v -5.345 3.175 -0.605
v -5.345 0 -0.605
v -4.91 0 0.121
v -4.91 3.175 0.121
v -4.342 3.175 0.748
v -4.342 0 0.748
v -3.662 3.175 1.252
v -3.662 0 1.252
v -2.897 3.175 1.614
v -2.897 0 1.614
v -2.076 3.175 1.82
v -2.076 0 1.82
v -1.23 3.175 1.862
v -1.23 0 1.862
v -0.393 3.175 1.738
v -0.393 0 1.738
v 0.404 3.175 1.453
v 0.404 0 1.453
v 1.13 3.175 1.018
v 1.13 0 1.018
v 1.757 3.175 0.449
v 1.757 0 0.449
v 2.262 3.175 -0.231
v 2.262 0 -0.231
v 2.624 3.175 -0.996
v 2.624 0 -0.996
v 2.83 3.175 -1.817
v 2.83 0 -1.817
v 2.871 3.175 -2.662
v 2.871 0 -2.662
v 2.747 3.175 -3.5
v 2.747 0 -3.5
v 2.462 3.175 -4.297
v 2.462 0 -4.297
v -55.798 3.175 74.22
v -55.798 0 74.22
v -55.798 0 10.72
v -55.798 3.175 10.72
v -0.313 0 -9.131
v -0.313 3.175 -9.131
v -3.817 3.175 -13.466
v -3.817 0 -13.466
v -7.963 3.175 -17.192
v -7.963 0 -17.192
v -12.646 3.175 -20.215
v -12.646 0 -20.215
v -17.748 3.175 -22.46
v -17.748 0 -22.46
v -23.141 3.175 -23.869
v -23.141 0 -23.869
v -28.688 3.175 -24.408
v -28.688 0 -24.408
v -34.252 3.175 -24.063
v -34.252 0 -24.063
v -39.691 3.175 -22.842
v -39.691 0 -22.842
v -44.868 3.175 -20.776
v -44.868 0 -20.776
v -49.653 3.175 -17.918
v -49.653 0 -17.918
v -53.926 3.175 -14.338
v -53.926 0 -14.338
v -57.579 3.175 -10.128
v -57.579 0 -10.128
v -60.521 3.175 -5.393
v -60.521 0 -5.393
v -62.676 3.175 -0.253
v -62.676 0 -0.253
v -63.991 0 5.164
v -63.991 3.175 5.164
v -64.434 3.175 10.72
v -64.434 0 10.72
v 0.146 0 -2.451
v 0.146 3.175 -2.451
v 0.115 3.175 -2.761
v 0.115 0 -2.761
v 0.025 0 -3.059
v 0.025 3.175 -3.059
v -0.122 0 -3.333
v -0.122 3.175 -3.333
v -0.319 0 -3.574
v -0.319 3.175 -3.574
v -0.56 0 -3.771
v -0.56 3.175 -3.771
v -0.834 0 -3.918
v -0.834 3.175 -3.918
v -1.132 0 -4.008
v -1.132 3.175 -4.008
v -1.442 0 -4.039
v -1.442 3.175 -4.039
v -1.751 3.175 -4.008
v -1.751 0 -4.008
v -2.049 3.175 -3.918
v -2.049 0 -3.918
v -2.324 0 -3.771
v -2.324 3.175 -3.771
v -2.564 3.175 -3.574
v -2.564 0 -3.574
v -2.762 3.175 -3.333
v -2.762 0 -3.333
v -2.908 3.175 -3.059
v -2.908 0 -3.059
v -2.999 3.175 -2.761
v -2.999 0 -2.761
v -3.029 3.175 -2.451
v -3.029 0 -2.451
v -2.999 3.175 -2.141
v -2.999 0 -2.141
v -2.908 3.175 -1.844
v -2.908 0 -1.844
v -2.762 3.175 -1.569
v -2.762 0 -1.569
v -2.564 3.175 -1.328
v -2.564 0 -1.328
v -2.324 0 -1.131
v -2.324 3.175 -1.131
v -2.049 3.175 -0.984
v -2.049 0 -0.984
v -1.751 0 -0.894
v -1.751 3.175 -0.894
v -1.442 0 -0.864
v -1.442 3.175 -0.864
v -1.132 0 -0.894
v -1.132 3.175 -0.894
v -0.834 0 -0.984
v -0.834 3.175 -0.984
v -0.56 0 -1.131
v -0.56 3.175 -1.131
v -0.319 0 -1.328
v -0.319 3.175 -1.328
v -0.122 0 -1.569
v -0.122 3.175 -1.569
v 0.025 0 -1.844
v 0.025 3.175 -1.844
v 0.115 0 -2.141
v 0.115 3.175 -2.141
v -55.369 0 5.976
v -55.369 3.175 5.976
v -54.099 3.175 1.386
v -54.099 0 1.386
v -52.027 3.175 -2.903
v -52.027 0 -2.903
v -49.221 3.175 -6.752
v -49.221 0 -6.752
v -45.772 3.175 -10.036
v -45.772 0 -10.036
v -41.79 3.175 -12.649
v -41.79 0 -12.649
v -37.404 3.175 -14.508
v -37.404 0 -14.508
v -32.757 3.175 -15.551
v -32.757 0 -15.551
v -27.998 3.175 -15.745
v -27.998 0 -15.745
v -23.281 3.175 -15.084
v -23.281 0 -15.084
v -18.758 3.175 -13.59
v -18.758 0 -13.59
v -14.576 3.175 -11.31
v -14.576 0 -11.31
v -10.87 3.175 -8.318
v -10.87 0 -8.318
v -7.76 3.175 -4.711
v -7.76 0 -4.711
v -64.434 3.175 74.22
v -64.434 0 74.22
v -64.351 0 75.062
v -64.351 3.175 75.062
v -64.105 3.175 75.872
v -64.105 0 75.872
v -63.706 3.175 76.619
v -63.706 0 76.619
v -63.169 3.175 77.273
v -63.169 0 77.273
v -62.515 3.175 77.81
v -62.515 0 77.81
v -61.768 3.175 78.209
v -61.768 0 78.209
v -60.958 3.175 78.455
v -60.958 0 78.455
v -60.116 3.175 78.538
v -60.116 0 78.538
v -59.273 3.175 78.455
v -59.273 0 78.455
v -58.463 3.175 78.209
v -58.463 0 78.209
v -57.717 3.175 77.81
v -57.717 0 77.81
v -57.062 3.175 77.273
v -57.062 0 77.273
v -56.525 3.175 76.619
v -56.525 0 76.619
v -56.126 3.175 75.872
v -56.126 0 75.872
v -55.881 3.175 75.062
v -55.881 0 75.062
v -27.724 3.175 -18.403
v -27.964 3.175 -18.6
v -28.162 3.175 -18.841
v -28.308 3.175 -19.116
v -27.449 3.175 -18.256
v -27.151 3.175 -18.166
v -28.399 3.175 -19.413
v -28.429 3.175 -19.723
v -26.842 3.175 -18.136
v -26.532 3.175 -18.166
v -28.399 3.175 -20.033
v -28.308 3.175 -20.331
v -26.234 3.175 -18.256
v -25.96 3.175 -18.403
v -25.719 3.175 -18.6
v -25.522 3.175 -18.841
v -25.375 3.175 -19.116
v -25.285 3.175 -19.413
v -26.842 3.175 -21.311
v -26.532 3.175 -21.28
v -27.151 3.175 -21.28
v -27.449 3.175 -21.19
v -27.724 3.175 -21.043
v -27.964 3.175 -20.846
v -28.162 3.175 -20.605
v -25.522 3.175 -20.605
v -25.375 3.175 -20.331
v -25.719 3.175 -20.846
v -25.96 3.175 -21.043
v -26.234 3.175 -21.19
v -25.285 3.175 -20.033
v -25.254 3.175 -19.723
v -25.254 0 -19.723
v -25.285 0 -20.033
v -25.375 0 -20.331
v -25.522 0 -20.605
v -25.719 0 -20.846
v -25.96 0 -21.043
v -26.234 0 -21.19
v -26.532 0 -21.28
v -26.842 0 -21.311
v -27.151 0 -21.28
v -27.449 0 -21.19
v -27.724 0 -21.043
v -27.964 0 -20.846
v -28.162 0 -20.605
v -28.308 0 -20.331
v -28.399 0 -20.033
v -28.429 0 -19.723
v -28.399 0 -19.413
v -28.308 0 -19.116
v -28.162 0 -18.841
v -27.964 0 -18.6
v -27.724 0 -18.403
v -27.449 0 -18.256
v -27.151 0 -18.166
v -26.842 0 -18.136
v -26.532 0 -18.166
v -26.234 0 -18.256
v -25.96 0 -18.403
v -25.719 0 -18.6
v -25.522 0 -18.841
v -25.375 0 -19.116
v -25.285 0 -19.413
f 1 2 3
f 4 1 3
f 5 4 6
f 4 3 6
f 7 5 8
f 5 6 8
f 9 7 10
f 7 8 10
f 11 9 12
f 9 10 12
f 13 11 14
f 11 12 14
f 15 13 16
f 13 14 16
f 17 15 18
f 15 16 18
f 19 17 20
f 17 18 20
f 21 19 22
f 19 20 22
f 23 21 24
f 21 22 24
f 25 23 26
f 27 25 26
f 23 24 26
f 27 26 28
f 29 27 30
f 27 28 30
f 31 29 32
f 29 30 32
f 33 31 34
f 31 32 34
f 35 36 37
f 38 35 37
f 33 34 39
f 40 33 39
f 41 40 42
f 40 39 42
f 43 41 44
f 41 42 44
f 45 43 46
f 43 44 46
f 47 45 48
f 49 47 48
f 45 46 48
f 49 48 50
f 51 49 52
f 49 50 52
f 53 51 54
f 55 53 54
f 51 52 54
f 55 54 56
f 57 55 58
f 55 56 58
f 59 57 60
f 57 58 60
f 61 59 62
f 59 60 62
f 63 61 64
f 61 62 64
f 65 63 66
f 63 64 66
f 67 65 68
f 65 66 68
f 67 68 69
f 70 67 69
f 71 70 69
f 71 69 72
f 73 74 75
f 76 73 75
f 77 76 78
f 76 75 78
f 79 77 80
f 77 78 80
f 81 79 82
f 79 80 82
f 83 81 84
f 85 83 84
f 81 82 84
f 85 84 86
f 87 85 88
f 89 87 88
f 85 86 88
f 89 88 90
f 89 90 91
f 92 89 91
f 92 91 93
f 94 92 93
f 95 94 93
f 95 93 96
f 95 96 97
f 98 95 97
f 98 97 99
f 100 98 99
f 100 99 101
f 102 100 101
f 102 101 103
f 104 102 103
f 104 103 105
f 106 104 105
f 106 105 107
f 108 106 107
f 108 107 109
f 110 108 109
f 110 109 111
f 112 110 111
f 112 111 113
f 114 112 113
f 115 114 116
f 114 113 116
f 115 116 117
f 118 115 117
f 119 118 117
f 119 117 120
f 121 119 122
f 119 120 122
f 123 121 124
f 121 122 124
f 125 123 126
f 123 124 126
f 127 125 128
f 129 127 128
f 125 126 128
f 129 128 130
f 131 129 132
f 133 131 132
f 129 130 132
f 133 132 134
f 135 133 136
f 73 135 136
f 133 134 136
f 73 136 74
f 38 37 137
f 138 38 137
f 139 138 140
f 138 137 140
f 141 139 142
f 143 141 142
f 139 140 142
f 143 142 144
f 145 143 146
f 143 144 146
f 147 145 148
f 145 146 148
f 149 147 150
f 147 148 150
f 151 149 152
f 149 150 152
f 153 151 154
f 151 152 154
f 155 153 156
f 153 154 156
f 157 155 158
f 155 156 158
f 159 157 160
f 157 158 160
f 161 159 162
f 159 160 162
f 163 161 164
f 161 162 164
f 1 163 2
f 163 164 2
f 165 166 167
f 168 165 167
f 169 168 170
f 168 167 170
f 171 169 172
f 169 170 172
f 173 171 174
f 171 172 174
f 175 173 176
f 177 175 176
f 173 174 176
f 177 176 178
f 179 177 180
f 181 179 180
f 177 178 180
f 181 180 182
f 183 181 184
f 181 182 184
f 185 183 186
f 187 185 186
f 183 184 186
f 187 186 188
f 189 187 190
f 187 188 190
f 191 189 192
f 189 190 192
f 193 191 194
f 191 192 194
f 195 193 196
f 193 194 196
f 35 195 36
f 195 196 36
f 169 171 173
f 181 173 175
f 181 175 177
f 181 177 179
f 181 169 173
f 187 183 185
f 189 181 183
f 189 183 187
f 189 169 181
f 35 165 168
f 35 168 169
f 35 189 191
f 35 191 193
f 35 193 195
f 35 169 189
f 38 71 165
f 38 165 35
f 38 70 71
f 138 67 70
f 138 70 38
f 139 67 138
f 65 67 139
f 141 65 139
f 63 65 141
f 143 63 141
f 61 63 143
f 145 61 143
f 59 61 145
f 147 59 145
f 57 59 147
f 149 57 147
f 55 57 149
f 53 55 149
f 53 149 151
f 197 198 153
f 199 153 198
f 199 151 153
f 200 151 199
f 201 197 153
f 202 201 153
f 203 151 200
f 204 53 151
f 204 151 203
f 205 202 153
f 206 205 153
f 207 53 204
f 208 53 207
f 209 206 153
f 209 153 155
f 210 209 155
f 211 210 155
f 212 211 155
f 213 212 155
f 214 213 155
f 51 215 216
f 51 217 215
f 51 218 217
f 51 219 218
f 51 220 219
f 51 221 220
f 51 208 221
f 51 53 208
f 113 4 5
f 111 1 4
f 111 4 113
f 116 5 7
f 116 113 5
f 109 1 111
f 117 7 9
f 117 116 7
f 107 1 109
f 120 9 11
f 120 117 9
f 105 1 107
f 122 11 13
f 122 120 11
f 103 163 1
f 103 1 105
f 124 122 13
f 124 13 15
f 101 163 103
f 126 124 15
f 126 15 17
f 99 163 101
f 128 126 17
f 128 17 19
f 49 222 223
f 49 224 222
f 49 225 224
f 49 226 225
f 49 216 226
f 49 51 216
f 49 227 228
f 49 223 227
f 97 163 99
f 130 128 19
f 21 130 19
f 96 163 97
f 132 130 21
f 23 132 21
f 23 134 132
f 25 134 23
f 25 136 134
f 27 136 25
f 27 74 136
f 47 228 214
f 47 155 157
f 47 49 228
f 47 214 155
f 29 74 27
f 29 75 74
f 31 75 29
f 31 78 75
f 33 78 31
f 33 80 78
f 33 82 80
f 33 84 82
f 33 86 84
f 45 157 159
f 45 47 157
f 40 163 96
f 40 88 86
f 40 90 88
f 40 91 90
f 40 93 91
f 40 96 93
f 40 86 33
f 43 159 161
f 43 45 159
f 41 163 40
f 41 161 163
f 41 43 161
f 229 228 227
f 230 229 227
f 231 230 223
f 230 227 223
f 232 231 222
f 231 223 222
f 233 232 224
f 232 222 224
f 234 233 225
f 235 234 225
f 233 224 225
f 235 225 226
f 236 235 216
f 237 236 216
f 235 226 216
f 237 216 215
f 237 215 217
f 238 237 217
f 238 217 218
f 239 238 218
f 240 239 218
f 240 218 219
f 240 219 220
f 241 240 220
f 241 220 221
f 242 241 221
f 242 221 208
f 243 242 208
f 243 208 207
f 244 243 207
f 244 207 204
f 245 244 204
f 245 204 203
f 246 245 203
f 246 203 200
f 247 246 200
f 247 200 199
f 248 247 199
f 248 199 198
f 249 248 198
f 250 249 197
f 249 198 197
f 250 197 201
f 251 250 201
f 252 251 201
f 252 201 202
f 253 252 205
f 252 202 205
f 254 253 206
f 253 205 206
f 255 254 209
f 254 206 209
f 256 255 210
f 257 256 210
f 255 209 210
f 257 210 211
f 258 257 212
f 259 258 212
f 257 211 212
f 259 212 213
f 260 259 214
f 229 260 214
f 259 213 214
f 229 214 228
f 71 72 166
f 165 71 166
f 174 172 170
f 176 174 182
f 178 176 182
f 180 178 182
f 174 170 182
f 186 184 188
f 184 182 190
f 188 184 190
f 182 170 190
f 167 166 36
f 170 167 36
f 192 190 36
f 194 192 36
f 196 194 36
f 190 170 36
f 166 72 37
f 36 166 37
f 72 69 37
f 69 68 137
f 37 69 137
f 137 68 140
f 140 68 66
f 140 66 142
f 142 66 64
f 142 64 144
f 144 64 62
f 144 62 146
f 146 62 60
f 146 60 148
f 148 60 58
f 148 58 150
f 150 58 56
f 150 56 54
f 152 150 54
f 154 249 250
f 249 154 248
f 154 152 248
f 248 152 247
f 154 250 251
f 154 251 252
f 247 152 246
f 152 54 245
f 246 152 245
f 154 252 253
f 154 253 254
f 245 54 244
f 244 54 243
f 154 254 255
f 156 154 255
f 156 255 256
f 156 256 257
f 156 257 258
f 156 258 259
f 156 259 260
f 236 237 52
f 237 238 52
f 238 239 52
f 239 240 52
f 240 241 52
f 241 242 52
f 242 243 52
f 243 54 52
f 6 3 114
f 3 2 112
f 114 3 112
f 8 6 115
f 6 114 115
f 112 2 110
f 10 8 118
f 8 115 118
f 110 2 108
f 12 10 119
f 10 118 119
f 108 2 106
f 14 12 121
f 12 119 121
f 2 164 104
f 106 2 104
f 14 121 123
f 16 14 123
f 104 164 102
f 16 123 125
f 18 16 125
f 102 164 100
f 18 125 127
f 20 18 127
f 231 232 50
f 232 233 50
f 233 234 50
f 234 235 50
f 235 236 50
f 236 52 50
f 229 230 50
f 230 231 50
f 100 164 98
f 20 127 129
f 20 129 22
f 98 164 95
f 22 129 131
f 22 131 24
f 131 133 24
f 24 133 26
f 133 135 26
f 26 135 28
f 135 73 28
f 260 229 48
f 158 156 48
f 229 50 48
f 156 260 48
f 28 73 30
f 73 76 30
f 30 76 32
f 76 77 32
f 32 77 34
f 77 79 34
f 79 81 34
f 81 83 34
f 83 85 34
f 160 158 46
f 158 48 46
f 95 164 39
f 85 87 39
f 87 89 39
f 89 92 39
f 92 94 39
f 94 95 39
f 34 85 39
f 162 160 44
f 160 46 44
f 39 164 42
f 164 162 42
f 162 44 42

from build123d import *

# Parameters (mm, degrees)
BOSS_EXTRUDE1_DEPTH = 3.175
SKETCH5_R           = 1.5875
CUT_EXTRUDE1_DEPTH  = 4.175


with BuildPart() as part:
    # Sketch2 → Boss-Extrude1 (new body)
    with BuildSketch(Plane(origin=(0, 0, 0), x_dir=(1, 0, 0), z_dir=(0, 1, 0))):
        with BuildLine():
            Line((-64.433559451, -10.720044429), (-64.433559451, -74.220044429))
            ThreePointArc((-64.433559451, -74.220044429), (-60.115559451, -78.538044429), (-55.797559451, -74.220044429))
            Line((-55.797559451, -74.220044429), (-55.797559451, -10.720044429))
            ThreePointArc((-55.797559451, -10.720044429), (-35.103902349, 15.133874618), (-5.345262109, 0.605423034))
            ThreePointArc((-5.345262109, 0.605423034), (0.404037892, -1.452682281), (2.462143207, 4.296617721))
            ThreePointArc((2.462143207, 4.296617721), (-36.995428675, 23.560180104), (-64.433559451, -10.720044429))
        make_face()
    extrude(amount=BOSS_EXTRUDE1_DEPTH)

    # Sketch5 → Cut-Extrude1 (cut, through all)
    with BuildSketch(Plane(origin=(0, 3.175, 0), x_dir=(1, 0, 0), z_dir=(0, 1, 0))):
        with Locations((-26.841559451, 19.723020377)):
            Circle(SKETCH5_R)
        with Locations((-1.441559451, 2.451020377)):
            Circle(SKETCH5_R)
    extrude(amount=-CUT_EXTRUDE1_DEPTH, mode=Mode.SUBTRACT)


solid = part.part
